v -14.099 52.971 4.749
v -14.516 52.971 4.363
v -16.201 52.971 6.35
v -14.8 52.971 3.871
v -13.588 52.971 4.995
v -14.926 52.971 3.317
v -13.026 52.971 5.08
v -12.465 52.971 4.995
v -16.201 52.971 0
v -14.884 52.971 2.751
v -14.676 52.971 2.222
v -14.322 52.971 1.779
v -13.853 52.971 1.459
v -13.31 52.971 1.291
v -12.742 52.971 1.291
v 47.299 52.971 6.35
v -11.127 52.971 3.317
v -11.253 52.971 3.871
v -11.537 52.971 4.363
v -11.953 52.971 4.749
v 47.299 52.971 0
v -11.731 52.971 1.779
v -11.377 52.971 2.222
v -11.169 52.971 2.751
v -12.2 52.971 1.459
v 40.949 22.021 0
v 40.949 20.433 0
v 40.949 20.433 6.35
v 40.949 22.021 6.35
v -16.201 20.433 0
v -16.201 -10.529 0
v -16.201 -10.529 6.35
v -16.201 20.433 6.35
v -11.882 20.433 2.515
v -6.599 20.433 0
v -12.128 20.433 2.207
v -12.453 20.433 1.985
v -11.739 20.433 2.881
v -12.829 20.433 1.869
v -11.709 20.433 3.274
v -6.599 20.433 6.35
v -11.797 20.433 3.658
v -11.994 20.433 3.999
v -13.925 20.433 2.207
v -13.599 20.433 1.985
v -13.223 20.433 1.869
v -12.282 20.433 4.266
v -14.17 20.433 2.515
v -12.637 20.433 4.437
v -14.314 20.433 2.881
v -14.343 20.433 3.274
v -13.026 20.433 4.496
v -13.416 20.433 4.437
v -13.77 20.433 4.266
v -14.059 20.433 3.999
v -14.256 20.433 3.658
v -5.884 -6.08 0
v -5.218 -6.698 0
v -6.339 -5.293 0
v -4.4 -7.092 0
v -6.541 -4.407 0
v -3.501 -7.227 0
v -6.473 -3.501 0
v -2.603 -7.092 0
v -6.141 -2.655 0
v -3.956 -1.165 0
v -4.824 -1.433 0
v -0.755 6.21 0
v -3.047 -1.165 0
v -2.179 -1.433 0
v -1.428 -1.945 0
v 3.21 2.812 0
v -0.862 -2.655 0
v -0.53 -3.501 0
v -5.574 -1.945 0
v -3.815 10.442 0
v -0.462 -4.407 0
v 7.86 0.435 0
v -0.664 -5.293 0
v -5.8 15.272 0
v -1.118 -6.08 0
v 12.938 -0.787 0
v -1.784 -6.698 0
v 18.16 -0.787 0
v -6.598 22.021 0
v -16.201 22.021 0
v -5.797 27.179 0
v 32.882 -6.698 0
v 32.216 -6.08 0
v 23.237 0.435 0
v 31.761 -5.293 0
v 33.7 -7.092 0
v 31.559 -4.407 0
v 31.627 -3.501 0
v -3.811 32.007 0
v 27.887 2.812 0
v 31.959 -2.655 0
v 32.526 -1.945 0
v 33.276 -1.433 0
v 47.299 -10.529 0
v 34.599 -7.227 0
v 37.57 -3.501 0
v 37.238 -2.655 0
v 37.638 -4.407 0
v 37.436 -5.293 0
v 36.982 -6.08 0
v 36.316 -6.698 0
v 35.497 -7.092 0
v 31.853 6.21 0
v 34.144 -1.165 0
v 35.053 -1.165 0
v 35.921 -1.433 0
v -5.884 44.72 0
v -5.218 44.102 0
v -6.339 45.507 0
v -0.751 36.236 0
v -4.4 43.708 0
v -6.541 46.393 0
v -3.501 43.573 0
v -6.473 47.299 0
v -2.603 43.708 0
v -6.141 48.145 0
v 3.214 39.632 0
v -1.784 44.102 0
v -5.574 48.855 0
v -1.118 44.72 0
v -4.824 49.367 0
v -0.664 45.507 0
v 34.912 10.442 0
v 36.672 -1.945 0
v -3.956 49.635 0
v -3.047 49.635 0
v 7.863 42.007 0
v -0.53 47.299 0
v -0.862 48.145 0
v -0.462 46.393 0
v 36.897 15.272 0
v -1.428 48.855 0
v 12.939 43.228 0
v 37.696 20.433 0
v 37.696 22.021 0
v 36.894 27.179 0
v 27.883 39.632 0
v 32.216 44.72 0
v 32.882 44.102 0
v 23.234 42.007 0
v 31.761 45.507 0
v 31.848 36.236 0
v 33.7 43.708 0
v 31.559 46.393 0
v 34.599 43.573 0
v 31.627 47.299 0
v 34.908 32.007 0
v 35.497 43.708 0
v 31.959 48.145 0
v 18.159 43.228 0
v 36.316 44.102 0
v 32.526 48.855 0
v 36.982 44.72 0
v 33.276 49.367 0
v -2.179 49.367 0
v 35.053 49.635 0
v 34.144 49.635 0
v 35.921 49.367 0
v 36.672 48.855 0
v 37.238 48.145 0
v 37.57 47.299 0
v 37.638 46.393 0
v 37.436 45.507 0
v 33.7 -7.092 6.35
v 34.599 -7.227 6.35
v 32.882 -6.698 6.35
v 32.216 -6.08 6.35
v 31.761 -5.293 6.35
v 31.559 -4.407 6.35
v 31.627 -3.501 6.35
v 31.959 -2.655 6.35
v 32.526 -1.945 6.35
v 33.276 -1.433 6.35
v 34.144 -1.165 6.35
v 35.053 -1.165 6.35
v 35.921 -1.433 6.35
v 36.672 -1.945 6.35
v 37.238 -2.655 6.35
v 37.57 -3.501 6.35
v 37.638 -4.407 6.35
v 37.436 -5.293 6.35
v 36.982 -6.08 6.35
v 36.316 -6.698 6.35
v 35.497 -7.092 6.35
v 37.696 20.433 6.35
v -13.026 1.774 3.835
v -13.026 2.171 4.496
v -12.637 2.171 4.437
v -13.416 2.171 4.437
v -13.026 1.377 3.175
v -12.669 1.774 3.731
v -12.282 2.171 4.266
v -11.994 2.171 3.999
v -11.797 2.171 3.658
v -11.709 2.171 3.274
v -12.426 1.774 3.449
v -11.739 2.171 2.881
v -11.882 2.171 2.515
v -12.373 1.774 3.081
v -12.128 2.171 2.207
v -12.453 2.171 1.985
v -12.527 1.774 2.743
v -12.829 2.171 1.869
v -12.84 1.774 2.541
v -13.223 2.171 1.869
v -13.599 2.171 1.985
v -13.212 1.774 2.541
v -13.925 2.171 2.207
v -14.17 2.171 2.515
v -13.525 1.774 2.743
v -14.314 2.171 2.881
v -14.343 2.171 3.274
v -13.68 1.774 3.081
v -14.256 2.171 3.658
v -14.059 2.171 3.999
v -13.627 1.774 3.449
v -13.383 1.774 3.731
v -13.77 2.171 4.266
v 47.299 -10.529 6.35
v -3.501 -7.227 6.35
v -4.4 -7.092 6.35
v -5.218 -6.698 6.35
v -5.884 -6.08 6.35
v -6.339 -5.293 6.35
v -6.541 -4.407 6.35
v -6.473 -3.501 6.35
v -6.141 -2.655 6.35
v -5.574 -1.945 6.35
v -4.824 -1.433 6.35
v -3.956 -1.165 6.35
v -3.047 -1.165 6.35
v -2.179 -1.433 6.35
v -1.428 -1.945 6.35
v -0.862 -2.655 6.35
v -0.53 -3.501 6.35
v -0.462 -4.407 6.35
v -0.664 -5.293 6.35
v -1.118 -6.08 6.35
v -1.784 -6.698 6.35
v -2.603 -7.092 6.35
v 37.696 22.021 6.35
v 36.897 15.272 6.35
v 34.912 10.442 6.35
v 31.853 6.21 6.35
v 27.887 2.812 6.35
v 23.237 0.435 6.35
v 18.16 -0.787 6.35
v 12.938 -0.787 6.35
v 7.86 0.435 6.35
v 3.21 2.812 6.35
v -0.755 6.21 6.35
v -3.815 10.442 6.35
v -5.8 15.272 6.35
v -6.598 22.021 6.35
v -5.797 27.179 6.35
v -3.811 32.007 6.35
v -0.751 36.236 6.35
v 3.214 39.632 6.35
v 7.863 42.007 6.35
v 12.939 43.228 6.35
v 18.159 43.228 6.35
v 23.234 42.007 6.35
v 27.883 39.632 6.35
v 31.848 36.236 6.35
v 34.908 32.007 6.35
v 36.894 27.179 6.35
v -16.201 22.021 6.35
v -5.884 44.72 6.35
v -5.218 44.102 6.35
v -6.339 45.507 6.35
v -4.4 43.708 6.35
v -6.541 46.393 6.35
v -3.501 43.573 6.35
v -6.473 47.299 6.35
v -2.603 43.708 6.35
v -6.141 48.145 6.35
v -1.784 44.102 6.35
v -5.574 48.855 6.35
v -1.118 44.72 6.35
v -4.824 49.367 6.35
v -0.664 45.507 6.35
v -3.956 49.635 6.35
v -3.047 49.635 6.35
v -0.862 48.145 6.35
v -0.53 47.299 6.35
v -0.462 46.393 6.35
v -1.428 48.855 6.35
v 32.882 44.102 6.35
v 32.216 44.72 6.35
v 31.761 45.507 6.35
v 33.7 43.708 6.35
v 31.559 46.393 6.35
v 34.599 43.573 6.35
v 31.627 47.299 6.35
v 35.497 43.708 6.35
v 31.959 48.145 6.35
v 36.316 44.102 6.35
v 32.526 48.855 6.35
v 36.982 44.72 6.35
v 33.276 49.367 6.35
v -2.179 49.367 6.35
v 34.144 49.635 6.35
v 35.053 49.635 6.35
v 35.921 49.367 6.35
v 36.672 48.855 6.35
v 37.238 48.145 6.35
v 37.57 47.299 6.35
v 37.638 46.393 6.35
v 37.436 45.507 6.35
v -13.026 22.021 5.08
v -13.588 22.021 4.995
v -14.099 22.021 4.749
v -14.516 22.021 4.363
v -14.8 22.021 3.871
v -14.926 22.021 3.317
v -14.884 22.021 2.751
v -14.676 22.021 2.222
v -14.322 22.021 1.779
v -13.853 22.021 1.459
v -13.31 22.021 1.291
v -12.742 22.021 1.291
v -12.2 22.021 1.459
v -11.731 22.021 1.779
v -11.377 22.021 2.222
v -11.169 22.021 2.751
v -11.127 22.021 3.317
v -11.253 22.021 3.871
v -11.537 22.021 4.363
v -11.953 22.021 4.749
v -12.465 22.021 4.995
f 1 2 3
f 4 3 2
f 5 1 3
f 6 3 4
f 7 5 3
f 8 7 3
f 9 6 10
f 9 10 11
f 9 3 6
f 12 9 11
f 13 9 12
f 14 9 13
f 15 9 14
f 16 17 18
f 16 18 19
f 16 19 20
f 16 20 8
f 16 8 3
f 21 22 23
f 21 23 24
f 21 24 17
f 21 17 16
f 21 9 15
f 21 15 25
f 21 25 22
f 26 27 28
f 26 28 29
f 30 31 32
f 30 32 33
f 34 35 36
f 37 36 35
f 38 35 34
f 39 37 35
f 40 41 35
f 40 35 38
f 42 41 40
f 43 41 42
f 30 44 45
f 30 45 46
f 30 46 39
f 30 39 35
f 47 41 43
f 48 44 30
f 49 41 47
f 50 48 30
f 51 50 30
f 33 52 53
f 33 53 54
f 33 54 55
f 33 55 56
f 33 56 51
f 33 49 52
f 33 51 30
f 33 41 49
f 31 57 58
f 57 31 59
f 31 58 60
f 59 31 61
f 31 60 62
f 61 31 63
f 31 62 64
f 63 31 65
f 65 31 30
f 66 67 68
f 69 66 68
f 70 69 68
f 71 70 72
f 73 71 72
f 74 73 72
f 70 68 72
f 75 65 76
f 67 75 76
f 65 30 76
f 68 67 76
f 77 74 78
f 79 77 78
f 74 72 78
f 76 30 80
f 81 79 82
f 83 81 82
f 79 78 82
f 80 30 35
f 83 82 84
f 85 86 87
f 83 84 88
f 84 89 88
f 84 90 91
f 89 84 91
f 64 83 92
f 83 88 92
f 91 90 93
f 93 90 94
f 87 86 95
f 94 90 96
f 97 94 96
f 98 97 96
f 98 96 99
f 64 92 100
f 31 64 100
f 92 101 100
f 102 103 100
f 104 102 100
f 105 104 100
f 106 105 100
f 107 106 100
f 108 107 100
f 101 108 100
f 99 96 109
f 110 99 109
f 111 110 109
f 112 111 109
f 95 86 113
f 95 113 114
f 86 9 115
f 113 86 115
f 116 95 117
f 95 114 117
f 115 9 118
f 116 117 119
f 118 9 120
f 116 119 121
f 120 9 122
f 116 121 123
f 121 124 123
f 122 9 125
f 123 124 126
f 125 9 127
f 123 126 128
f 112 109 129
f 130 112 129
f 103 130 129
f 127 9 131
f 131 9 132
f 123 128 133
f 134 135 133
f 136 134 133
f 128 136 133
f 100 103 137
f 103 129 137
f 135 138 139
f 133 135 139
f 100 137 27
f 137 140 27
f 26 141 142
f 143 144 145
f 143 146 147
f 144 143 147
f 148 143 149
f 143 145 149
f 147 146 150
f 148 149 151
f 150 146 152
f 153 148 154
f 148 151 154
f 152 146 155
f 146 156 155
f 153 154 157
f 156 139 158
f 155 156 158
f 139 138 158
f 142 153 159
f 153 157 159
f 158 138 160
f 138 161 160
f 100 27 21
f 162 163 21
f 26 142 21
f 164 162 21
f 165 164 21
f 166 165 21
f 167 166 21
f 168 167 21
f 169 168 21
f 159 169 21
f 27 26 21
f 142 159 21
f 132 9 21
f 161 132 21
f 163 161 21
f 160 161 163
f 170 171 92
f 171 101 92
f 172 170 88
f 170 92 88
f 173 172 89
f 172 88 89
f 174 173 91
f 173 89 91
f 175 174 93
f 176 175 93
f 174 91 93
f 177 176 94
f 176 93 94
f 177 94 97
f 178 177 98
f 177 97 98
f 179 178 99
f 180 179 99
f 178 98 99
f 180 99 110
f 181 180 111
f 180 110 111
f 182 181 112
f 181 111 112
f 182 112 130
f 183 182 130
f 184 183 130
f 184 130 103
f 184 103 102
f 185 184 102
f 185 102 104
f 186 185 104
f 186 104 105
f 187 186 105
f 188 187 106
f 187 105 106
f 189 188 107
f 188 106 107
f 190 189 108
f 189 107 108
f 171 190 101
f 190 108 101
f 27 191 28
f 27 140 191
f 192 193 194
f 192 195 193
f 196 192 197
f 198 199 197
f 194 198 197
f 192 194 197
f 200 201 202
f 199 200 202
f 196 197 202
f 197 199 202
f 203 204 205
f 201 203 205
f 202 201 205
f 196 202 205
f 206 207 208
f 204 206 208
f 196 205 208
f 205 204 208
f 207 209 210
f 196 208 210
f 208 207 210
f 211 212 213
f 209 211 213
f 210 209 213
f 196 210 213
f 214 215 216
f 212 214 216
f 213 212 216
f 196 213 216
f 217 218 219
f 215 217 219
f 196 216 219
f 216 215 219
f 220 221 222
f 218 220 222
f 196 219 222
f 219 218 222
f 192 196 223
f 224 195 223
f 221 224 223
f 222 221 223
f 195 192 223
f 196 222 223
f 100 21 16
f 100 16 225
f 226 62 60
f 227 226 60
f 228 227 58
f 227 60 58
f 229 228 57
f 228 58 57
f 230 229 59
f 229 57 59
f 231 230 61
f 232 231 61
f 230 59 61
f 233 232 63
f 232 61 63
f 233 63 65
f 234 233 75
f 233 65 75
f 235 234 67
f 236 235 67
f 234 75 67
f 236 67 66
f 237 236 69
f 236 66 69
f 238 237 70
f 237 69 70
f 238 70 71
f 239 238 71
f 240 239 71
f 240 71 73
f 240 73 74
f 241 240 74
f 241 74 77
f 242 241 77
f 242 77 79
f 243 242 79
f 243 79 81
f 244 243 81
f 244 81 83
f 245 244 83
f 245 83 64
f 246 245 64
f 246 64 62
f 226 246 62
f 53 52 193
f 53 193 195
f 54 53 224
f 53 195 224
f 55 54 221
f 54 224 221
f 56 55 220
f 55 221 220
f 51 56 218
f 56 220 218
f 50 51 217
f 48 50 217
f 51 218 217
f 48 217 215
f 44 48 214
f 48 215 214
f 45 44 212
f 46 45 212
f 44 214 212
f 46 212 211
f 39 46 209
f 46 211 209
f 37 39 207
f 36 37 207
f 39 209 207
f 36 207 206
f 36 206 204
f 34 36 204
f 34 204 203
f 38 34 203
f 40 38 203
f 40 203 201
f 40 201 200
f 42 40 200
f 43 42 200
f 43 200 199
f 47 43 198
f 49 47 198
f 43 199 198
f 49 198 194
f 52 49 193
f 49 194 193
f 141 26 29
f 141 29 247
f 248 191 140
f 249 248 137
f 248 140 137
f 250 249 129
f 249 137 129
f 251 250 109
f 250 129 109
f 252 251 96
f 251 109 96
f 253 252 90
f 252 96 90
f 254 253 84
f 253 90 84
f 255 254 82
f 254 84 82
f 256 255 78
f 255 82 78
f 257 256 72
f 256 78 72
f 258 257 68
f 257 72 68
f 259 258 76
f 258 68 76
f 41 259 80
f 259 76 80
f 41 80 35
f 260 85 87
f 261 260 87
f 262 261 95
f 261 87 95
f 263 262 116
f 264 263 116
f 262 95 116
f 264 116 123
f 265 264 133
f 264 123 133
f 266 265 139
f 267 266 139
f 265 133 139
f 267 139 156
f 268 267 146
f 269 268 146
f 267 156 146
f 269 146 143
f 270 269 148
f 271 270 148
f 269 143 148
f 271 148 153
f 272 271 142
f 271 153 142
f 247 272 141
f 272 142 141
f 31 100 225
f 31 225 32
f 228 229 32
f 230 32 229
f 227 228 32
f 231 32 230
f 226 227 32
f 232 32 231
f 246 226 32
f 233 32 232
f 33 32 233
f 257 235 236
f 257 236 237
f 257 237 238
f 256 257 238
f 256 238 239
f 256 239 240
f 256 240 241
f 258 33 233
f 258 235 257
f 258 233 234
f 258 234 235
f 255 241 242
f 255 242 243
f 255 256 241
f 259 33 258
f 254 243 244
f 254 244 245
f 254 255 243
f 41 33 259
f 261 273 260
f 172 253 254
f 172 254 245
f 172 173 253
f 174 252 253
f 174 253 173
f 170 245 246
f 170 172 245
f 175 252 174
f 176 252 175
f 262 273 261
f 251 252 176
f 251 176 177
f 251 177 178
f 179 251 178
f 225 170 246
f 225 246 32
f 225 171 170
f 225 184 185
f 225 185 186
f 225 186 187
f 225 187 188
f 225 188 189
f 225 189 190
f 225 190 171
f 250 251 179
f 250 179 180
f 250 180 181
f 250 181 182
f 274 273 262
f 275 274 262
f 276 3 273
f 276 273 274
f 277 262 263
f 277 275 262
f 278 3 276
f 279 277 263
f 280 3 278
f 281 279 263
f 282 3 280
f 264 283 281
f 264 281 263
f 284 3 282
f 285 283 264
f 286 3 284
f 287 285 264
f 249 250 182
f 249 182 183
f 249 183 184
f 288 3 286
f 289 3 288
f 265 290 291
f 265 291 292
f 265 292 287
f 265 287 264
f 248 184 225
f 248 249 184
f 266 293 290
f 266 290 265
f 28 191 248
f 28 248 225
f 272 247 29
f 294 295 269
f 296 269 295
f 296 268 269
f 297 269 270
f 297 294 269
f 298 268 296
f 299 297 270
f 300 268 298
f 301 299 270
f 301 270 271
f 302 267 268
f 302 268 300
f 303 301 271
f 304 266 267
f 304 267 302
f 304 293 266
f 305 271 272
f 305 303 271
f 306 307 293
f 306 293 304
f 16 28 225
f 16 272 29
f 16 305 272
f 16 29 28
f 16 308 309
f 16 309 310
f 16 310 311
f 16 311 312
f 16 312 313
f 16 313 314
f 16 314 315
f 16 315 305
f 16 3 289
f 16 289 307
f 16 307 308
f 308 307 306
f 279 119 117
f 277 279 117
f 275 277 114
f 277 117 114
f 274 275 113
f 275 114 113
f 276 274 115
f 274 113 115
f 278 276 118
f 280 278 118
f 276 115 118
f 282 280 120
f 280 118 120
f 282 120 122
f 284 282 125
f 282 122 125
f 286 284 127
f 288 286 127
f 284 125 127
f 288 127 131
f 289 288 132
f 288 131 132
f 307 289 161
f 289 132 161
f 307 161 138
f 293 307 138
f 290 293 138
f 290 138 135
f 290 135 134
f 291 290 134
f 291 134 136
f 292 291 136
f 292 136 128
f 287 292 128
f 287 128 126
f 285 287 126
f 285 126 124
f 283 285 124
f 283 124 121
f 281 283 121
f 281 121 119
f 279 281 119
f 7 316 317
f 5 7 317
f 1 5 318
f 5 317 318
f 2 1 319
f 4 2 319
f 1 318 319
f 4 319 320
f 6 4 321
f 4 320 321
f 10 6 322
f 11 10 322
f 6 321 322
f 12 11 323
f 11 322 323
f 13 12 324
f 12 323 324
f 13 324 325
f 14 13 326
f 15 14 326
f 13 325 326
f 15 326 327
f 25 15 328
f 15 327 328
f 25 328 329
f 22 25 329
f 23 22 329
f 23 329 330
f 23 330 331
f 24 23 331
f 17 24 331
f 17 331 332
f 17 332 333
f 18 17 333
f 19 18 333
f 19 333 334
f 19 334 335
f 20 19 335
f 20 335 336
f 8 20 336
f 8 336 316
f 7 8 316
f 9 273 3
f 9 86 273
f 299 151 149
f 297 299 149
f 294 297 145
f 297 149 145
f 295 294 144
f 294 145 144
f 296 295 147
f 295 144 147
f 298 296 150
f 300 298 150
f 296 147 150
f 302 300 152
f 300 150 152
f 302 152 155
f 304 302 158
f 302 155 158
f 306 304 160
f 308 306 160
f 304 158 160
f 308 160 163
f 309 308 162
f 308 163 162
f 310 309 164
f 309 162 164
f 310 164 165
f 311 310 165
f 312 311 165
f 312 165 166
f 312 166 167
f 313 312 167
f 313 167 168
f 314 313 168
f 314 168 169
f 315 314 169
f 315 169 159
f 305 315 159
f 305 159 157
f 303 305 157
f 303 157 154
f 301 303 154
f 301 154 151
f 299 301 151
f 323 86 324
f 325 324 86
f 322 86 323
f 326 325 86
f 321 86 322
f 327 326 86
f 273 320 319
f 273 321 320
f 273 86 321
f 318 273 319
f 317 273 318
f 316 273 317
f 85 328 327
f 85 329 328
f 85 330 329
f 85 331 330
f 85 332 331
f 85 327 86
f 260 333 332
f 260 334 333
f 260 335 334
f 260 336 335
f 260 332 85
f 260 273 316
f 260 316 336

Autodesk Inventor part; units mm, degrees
ref_plane "YZ Plane" through (0, 0, 0) normal (1, 0, 0) x (0, 1, 0)
ref_plane "XZ Plane" through (0, 0, 0) normal (0, 1, 0) x (-1, 0, 0)
ref_plane "XY Plane" through (0, 0, 0) normal (0, 0, 1) x (1, 0, 0)
sketch "Sketch1" plane through (0, 0, 0) normal (0, 0, 1) x (1, 0, 0)
  line L0 (-16.2013, 52.9706) -> (47.2987, 52.9706)
  line L1 (47.2987, 52.9706) -> (47.2987, -10.5294)
  line L2 (47.2987, -10.5294) -> (-16.2013, -10.5294)
  line L3 (-16.2013, -10.5294) -> (-16.2013, 52.9706)
  point P0 (0, 0)
  dimension "d0" = 63.5
  dimension "d1" = 63.5
extrude "Extrusion1" add sketch "Sketch1" along normal blind 6.35
sketch "Sketch2" plane through (0, 0, 6.35) normal (0, 0, 1) x (1, 0, 0)
  line L0 (-16.2013, -10.5294) -> (-16.2013, 52.9706) projected
  line L1 (47.2987, -10.5294) -> (-16.2013, -10.5294) projected
  point P0 (0, 0)
  point P1 (15.5487, 21.2206)
  dimension "d4" = 31.75
  dimension "d5" = 31.75
hole "Hole1" at (15.5487, 21.2206, 6.35) direction (0, 0, -1) diameter 44.323 end through all
sketch "Sketch3" plane through (0, 0, 6.35) normal (0, 0, 1) x (1, 0, 0)
  line L0 (47.2987, 52.9706) -> (47.2987, -10.5294) projected
  line L1 (-16.2013, 52.9706) -> (47.2987, 52.9706) projected
  line L2 (-16.2013, -10.5294) -> (-16.2013, 52.9706) projected
  line L3 (47.2987, -10.5294) -> (-16.2013, -10.5294) projected
  point P0 (0, 0)
  point P1 (-3.5013, 46.6206)
  point P2 (34.5987, 46.6206)
  point P3 (-3.5013, -4.1794)
  point P4 (34.5987, -4.1794)
  dimension "d13" = 6.35
  dimension "d14" = 12.7
  dimension "d15" = 12.7
  dimension "d16" = 6.35
  dimension "d24" = 12.7
  dimension "d25" = 12.7
hole "Hole2" at (-3.5013, 46.6206, 6.35) at (34.5987, 46.6206, 6.35) at (-3.5013, -4.1794, 6.35) at (34.5987, -4.1794, 6.35) direction (0, 0, -1) diameter 6.096 end through all
sketch "Sketch4" plane through (0, 0, 6.35) normal (0, 0, 1) x (1, 0, 0)
  line L0 (-16.2013, 52.9706) -> (47.2987, 52.9706) projected
  line L1 (-4.7209, 20.4332) -> (-21.033, 20.4332)
  line L2 (-21.033, 20.4332) -> (-21.033, 22.0207)
  line L3 (-21.033, 22.0207) -> (-4.7209, 22.0207)
  line L4 (-4.7209, 22.0207) -> (-4.7209, 20.4332)
  point P0 (0, 0)
  dimension "d26" = 1.5875
  dimension "d27" = 30.9499
extrude "Extrusion2" cut sketch "Sketch4" against normal blind 6.35
sketch "Sketch5" plane through (-16.2013, 52.9706, 0) normal (0, 1, 0) x (1, 0, 0)
  line L0 (0, 0) -> (63.5, 0) projected
  line L1 (0, 0) -> (0, -6.35) projected
  point P0 (16.2013, 0)
  point P1 (3.175, -3.175)
  dimension "d30" = 3.175
  dimension "d31" = 3.175
hole "Hole3" at (-13.0263, 52.9706, 3.175) direction (0, -1, 0) diameter 2.6416 depth 50.8 tip angle 118 thread size "6-32 UNC" class "2B" standard "ANSI Unified Screw Threads"
sketch "Sketch6" plane through (-16.2013, 52.9706, 0) normal (0, 1, 0) x (1, 0, 0)
  circle A0 centre (3.175, -3.175) radius 1.3208 projected
  point P0 (16.2013, 0)
hole "Hole4" at (-13.0263, 52.9706, 3.175) direction (0, -1, 0) diameter 3.81 depth 31.75 tip angle 118
sketch "Sketch7" plane through (0, 0, 0) normal (0, 0, -1) x (-1, 0, 0)
  line L0 (-47.2987, 52.9706) -> (-47.2987, -10.5294) projected
  line L1 (-40.9487, 22.0207) -> (-35.1672, 22.0207)
  line L2 (-35.1672, 22.0207) -> (-35.1672, 20.4332)
  line L3 (-35.1672, 20.4332) -> (-40.9487, 20.4332)
  line L4 (-40.9487, 20.4332) -> (-40.9487, 22.0207)
  point P0 (0, 0)
  dimension "d46" = 6.35
extrude "Extrusion3" cut sketch "Sketch7" against normal blind 6.35
properties part number "JF-AT-JC0015" material "Aluminum-6061 (Anodized Black)"
